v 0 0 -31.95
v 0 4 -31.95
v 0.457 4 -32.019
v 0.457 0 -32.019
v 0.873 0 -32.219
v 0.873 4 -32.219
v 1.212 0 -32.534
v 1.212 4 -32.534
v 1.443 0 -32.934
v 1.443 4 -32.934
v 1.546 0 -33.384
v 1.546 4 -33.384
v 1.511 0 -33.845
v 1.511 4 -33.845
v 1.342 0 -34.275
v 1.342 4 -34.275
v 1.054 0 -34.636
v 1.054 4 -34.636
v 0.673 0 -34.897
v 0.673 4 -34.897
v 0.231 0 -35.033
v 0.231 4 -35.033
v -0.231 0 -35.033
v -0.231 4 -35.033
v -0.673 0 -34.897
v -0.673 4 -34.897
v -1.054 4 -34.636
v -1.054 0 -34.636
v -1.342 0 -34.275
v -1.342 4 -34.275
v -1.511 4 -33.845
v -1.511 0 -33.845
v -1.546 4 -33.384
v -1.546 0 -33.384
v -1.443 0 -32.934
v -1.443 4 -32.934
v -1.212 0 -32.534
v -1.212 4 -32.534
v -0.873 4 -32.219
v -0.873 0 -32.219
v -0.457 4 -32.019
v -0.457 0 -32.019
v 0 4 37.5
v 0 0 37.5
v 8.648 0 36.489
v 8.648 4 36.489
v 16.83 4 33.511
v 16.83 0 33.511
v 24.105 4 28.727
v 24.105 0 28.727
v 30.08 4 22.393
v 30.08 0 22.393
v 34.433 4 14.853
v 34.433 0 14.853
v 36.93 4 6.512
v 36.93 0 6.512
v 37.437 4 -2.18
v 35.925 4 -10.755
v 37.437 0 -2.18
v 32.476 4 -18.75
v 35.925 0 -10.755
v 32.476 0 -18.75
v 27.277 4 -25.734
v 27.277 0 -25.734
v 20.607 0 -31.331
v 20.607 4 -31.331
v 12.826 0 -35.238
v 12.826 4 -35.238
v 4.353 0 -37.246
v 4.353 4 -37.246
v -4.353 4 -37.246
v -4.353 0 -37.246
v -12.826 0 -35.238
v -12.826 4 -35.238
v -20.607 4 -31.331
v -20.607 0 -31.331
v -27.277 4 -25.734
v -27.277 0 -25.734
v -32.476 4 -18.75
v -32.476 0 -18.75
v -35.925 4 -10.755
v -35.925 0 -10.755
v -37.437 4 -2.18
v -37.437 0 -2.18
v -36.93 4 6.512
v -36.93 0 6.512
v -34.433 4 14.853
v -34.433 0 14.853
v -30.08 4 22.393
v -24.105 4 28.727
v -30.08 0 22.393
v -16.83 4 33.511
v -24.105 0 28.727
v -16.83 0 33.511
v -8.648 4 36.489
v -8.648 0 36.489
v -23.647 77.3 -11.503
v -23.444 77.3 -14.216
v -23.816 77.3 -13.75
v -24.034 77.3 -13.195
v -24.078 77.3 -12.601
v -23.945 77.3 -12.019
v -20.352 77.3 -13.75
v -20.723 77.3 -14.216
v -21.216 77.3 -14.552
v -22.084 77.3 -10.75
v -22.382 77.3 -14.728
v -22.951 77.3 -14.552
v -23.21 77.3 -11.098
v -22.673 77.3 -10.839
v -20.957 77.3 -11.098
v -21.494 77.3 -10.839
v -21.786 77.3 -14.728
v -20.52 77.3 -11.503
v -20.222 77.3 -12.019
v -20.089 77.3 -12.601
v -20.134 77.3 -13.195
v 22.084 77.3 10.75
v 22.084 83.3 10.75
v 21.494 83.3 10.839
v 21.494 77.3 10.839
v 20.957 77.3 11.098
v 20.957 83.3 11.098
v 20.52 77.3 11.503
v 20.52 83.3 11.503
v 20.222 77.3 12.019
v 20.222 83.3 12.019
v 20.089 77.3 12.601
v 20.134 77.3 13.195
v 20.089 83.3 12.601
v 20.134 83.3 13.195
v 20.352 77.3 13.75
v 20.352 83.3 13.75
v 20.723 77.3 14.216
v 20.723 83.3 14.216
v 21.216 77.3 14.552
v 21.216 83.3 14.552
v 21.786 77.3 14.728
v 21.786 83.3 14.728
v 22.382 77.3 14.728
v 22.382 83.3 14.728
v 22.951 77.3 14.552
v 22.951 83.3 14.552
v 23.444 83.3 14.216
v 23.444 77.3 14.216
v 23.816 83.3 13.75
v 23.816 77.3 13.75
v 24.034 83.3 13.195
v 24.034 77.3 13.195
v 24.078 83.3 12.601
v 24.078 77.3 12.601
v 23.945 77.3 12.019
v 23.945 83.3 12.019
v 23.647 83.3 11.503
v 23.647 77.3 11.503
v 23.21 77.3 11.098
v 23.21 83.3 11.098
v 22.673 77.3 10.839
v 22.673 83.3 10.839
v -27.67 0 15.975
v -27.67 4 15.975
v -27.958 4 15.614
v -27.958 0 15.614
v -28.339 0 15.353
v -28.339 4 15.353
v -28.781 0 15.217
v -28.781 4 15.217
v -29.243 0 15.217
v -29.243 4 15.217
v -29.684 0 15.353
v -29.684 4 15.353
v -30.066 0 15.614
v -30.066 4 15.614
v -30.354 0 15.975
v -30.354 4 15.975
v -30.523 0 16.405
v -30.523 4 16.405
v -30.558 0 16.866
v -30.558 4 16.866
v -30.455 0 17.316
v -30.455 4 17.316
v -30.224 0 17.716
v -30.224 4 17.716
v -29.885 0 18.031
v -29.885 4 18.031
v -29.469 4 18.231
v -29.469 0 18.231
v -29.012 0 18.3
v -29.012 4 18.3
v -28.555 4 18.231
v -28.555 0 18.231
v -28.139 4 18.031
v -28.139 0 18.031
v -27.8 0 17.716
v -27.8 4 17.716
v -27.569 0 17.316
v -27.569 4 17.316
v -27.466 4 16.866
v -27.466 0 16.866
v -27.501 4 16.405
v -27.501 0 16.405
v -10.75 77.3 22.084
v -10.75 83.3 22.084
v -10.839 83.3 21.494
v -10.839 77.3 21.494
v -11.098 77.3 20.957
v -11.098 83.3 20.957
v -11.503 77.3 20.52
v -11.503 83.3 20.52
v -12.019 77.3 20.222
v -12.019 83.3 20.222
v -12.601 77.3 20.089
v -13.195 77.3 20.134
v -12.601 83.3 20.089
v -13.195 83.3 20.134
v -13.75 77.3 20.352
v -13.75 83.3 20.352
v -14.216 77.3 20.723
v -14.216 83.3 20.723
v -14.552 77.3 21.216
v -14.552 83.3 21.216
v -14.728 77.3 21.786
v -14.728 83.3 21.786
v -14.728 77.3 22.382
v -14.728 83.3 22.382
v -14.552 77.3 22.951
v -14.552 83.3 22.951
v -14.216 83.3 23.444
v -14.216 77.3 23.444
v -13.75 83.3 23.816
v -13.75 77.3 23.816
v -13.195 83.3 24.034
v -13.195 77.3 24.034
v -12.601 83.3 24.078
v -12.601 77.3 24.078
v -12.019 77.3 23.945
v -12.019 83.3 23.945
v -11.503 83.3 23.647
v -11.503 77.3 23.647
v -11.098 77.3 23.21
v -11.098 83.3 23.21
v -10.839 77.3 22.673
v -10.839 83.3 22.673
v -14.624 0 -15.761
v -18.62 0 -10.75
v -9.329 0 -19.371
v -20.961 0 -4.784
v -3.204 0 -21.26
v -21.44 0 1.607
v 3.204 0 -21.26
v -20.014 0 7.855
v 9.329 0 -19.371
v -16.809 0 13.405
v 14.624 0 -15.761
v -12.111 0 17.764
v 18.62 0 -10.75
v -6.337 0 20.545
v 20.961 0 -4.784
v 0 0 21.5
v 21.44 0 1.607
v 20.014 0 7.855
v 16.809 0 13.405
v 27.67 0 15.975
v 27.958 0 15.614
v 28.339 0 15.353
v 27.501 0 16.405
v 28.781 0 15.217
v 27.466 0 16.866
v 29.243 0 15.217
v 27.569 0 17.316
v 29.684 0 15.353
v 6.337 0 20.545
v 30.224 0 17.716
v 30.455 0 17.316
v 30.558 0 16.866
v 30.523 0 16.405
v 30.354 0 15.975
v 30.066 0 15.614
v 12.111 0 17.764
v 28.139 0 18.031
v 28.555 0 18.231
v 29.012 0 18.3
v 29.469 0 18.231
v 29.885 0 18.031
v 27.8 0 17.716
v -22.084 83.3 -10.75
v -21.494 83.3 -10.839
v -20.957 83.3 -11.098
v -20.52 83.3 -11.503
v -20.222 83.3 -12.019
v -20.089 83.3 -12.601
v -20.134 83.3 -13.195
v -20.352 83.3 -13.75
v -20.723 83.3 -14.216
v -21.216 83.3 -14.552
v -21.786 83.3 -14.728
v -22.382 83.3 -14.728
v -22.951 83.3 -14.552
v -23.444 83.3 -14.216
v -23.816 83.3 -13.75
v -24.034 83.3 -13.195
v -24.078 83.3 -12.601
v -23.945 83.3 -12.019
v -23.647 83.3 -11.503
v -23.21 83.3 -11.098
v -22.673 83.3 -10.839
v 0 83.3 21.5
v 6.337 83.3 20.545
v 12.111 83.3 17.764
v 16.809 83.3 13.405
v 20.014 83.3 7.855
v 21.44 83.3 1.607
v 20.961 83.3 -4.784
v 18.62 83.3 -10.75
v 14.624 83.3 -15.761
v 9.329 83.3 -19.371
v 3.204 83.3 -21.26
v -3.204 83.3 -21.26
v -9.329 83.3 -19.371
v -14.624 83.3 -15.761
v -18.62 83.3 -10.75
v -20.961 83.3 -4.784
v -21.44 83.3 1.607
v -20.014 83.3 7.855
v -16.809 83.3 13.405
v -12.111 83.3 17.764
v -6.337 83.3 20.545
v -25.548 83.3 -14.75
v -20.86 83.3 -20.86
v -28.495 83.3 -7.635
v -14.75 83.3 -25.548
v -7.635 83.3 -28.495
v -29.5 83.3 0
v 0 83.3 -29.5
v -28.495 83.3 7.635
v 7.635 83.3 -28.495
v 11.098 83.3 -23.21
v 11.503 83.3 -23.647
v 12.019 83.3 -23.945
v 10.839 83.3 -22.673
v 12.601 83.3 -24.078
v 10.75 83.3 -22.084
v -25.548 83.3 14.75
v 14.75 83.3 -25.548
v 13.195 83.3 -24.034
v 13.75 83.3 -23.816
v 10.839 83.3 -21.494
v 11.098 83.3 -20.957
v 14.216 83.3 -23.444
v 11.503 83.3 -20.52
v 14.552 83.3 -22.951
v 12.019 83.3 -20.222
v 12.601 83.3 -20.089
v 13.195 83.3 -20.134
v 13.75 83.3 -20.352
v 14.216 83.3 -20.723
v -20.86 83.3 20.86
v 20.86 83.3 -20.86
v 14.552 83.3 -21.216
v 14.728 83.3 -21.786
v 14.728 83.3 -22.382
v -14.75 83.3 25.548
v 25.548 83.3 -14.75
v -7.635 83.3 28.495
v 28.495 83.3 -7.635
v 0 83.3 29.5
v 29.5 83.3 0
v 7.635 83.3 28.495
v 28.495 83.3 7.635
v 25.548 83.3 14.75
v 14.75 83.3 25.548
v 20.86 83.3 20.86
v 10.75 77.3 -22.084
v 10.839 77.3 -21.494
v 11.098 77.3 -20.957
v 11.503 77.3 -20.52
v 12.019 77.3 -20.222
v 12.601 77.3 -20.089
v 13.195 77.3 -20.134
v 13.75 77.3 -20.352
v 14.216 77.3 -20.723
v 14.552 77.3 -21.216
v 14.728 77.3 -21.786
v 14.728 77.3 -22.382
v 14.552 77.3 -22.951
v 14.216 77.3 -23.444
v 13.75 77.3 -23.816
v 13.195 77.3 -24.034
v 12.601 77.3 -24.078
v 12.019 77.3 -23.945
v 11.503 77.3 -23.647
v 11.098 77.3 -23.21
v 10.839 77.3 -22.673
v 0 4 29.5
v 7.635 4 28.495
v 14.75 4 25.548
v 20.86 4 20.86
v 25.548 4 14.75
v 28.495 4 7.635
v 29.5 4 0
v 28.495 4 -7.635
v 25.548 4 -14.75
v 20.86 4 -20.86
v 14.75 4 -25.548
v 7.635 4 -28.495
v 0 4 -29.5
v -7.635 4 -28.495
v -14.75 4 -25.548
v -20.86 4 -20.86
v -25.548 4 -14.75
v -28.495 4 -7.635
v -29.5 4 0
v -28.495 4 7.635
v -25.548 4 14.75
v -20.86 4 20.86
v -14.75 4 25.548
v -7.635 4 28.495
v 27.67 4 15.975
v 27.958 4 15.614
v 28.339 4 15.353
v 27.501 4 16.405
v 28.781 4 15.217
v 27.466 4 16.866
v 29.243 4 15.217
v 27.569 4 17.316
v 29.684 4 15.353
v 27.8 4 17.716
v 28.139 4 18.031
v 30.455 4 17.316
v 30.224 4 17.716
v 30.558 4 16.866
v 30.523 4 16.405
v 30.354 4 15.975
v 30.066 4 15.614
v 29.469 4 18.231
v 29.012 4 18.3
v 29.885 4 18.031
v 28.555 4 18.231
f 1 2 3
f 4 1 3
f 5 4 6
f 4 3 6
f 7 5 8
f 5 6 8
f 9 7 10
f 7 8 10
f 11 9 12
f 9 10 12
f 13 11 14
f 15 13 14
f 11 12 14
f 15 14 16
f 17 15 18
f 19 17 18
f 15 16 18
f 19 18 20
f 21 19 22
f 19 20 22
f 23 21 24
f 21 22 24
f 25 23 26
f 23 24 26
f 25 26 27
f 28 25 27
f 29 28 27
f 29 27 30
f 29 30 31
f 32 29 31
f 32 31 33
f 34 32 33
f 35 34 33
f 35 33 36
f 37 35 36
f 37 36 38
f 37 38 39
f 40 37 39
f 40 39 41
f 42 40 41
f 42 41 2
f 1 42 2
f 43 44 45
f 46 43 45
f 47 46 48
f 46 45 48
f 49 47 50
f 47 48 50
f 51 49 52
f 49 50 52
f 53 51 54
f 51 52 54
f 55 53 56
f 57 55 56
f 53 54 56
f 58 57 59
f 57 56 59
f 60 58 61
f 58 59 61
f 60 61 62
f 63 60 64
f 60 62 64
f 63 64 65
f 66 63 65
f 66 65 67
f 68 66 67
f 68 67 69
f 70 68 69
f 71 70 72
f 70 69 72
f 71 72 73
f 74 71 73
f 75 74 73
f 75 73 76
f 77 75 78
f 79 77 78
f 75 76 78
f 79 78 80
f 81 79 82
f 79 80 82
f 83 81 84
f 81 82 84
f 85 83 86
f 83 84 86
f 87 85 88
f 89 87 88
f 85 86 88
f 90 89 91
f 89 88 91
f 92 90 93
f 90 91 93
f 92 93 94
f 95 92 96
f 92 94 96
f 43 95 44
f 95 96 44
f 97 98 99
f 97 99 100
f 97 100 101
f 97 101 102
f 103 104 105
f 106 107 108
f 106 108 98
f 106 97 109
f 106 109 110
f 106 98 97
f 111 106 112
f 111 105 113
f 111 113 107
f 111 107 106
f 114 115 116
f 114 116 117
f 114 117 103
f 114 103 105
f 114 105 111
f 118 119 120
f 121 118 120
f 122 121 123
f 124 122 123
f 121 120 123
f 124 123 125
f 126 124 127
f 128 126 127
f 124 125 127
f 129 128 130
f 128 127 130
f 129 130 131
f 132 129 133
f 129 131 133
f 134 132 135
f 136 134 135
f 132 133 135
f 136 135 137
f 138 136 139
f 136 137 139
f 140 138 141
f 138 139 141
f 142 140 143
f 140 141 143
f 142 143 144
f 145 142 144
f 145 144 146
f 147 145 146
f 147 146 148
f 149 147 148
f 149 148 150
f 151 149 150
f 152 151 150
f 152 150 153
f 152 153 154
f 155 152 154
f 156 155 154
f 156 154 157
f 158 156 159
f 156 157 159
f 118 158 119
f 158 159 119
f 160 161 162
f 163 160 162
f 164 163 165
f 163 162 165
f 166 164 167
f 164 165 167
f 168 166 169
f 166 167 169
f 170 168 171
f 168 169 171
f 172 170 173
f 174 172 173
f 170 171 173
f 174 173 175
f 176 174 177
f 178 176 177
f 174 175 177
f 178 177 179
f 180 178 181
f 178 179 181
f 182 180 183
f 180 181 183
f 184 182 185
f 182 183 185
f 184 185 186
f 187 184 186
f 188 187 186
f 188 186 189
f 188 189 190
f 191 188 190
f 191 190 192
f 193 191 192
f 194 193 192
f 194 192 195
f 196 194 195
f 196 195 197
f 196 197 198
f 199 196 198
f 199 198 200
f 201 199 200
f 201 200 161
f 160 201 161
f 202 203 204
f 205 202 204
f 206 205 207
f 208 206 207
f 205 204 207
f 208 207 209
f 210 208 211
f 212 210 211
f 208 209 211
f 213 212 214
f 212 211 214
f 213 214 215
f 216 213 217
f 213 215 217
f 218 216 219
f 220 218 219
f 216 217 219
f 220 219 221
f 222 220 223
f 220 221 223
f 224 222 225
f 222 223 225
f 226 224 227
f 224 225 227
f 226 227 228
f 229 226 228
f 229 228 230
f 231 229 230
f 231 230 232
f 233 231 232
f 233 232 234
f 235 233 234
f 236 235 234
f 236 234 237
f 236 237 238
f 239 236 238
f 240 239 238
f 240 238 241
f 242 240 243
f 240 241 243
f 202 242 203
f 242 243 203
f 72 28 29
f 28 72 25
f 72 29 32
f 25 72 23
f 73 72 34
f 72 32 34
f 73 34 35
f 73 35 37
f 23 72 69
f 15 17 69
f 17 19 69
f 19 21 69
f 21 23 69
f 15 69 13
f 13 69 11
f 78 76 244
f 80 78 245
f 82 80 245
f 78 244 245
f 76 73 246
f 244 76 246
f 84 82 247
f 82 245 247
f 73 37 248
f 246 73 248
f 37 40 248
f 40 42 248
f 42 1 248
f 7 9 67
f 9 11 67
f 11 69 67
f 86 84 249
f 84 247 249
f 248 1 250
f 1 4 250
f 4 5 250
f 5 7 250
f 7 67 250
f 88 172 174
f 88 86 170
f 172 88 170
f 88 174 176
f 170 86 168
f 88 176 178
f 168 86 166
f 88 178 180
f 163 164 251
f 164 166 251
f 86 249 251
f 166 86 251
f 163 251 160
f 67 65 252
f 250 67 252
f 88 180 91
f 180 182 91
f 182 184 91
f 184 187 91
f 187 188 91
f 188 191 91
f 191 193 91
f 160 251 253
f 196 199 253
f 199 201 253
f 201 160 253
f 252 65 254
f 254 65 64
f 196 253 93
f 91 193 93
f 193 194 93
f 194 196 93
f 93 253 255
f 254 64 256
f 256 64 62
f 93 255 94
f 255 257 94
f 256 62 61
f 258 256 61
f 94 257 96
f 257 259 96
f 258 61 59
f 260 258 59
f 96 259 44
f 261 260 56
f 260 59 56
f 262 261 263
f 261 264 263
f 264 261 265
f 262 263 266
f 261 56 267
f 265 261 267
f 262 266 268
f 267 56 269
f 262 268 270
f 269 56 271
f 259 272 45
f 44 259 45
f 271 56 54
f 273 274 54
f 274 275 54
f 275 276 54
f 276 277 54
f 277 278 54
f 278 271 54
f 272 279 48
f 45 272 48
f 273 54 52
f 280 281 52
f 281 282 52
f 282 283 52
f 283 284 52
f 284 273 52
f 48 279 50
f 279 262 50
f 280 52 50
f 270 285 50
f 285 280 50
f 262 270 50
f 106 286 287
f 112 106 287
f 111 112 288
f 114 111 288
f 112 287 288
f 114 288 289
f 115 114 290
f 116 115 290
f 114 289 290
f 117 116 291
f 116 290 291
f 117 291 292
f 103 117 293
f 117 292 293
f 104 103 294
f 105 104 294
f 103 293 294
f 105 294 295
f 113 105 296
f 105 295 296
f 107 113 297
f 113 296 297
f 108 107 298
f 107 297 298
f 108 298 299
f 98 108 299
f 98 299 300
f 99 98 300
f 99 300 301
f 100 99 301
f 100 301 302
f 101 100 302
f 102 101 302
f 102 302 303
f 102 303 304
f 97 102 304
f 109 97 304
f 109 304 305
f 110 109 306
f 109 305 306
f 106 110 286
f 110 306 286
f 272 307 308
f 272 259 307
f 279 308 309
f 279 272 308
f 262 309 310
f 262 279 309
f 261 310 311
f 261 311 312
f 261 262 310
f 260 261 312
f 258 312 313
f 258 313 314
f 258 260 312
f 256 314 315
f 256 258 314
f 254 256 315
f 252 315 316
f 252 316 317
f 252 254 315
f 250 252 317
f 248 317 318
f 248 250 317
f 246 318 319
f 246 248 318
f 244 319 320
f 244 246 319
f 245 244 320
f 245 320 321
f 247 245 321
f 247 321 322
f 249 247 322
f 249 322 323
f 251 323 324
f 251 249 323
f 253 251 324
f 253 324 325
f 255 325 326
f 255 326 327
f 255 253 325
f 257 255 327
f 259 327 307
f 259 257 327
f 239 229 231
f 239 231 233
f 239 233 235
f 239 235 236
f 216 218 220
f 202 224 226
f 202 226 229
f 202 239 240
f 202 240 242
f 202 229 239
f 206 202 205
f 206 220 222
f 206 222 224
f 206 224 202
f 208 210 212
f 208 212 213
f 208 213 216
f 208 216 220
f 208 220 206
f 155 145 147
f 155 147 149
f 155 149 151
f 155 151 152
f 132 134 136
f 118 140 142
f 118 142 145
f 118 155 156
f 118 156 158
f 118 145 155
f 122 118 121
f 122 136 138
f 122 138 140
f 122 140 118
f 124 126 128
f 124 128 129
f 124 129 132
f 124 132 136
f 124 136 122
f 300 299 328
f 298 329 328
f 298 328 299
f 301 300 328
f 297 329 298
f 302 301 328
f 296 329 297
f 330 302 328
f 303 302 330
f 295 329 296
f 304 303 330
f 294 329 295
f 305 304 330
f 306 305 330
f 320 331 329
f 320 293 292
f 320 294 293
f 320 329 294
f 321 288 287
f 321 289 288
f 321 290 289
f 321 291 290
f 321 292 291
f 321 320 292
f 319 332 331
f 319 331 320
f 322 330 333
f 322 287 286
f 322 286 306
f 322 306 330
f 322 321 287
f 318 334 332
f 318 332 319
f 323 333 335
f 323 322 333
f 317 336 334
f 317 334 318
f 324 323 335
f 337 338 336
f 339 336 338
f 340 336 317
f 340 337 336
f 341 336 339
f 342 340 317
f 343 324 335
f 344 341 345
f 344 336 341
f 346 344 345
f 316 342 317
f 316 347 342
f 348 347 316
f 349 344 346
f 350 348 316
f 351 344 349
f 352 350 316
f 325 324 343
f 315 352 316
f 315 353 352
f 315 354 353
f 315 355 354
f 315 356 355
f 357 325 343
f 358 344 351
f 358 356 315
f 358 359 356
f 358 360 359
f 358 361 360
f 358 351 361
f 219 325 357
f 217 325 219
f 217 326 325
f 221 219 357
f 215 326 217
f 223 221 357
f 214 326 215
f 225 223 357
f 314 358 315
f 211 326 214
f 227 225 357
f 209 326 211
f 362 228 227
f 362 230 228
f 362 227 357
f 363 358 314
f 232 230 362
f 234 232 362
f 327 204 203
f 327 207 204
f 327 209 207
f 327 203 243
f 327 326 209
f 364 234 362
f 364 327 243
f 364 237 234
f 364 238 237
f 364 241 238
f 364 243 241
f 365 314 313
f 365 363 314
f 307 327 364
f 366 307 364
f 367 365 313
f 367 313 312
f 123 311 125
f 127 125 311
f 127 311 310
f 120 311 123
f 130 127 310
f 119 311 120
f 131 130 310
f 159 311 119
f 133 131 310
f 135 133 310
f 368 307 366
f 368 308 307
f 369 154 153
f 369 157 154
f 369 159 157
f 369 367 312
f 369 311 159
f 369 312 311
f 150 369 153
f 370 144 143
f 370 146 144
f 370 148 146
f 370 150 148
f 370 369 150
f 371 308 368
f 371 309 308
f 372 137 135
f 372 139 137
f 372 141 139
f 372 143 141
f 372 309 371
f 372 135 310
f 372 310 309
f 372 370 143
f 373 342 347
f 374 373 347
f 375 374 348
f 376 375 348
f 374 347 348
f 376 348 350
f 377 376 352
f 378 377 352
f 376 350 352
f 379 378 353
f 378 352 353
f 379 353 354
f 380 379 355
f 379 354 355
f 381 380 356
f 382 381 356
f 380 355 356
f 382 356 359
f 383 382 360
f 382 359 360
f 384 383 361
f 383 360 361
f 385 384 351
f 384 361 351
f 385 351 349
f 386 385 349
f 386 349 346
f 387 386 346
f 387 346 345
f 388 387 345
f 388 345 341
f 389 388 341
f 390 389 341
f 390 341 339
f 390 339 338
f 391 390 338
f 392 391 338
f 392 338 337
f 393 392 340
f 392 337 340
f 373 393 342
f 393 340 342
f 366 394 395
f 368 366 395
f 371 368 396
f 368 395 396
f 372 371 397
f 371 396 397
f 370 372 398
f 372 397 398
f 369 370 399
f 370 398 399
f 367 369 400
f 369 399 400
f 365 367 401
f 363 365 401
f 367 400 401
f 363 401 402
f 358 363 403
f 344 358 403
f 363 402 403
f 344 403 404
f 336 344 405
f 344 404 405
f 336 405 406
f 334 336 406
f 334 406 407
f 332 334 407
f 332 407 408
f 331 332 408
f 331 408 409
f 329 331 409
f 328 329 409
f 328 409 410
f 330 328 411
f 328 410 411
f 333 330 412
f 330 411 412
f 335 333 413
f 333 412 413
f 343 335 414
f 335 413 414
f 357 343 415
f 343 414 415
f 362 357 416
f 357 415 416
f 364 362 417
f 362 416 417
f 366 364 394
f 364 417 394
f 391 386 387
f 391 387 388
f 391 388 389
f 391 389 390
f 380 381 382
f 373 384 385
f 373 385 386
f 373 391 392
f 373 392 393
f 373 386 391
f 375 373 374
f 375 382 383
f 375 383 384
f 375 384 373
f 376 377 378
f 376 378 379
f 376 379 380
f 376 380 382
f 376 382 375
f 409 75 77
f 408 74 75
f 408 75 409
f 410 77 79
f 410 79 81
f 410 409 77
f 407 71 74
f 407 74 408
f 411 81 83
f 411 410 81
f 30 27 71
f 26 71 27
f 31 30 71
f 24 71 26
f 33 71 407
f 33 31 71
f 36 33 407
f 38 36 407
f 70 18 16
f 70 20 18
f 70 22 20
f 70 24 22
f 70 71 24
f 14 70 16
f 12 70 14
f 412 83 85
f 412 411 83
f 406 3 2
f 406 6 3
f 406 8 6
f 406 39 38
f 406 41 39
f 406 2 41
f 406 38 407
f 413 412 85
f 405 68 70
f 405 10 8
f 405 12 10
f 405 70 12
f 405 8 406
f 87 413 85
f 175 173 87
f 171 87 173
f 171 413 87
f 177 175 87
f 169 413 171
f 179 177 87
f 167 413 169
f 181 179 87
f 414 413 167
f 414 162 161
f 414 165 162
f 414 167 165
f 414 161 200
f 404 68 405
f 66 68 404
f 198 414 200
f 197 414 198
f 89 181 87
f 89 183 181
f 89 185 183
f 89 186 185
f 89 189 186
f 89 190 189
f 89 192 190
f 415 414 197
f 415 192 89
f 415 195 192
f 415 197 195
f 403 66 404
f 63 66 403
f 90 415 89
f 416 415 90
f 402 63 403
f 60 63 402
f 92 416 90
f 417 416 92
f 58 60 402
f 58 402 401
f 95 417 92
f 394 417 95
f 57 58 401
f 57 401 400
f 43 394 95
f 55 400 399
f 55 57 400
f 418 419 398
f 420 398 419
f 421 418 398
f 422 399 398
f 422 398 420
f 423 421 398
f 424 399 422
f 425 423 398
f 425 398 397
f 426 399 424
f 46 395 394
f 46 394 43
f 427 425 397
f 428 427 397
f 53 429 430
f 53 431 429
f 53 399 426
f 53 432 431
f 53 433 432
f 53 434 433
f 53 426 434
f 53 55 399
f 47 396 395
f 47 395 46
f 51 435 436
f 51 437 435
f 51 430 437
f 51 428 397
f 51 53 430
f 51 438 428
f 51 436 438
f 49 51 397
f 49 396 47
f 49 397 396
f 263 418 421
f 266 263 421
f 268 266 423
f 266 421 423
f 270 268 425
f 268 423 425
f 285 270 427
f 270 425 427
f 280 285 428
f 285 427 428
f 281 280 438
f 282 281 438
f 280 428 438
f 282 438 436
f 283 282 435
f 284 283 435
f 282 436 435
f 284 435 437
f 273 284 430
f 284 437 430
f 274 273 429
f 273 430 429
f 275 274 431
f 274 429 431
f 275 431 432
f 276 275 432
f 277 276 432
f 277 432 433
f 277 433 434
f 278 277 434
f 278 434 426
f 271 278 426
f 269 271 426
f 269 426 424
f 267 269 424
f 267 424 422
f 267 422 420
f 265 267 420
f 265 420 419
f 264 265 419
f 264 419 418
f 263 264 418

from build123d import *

# Parameters (mm, degrees)
SKETCH1_R           = 37.5
SKETCH1_R_2         = 21.5
BOSS_EXTRUDE1_DEPTH = 4
SKETCH2_R           = 29.5
SKETCH2_R_2         = 21.5
BOSS_EXTRUDE2_DEPTH = 79.3
SKETCH3_R           = 1.55
CUT_EXTRUDE1_DEPTH  = 96.399109011
CIRPATTERN1_COUNT   = 3
SKETCH4_R           = 2
CUT_EXTRUDE2_DEPTH  = 6
CIRPATTERN2_COUNT   = 4


with BuildPart() as part:
    # Sketch1 → Boss-Extrude1 (new body)
    with BuildSketch(Plane(origin=(0, 0, 0), x_dir=(1, 0, 0), z_dir=(0, 1, 0))):
        with Locations(Location((0, 0, 0), (0, 0, 270))):
            Circle(SKETCH1_R)
        with Locations(Location((0, 0, 0), (0, 0, 270))):
            Circle(SKETCH1_R_2, mode=Mode.SUBTRACT)
    extrude(amount=BOSS_EXTRUDE1_DEPTH)

    # Sketch2 → Boss-Extrude2 (add)
    with BuildSketch(Plane(origin=(0, 4, 0), x_dir=(1, 0, 0), z_dir=(0, 1, 0))):
        with Locations(Location((0, 0, 0), (0, 0, 270))):
            Circle(SKETCH2_R)
        with Locations(Location((0, 0, 0), (0, 0, 270))):
            Circle(SKETCH2_R_2, mode=Mode.SUBTRACT)
    extrude(amount=BOSS_EXTRUDE2_DEPTH)

    # Sketch3 → Cut-Extrude1 (cut, through all)
    with BuildSketch(Plane(origin=(0, 4, 0), x_dir=(1, 0, 0), z_dir=(0, 1, 0))):
        with Locations(Location((0, 33.5, 0), (0, 0, 270))):
            Circle(SKETCH3_R)
    cut_extrude1 = extrude(amount=-CUT_EXTRUDE1_DEPTH, mode=Mode.SUBTRACT)

    # CirPattern1: Cut-Extrude1 ×3 about axis
    cirpattern1_axis = Axis((0, 0, 0), (0, 1, 0))
    for i in range(1, CIRPATTERN1_COUNT):
        add(cut_extrude1.rotate(cirpattern1_axis, i * 360 / CIRPATTERN1_COUNT), mode=Mode.SUBTRACT)

    # Sketch4 → Cut-Extrude2 (cut)
    with BuildSketch(Plane(origin=(0, 83.3, 0), x_dir=(1, 0, 0), z_dir=(0, 1, 0))):
        with Locations(Location((-22.083647797, 12.75, 0), (0, 0, 270))):
            Circle(SKETCH4_R)
    cut_extrude2 = extrude(amount=-CUT_EXTRUDE2_DEPTH, mode=Mode.SUBTRACT)

    # CirPattern2: Cut-Extrude2 ×4 about axis
    cirpattern2_axis = Axis((0, 0, 0), (0, 1, 0))
    for i in range(1, CIRPATTERN2_COUNT):
        add(cut_extrude2.rotate(cirpattern2_axis, i * 360 / CIRPATTERN2_COUNT), mode=Mode.SUBTRACT)


solid = part.part
